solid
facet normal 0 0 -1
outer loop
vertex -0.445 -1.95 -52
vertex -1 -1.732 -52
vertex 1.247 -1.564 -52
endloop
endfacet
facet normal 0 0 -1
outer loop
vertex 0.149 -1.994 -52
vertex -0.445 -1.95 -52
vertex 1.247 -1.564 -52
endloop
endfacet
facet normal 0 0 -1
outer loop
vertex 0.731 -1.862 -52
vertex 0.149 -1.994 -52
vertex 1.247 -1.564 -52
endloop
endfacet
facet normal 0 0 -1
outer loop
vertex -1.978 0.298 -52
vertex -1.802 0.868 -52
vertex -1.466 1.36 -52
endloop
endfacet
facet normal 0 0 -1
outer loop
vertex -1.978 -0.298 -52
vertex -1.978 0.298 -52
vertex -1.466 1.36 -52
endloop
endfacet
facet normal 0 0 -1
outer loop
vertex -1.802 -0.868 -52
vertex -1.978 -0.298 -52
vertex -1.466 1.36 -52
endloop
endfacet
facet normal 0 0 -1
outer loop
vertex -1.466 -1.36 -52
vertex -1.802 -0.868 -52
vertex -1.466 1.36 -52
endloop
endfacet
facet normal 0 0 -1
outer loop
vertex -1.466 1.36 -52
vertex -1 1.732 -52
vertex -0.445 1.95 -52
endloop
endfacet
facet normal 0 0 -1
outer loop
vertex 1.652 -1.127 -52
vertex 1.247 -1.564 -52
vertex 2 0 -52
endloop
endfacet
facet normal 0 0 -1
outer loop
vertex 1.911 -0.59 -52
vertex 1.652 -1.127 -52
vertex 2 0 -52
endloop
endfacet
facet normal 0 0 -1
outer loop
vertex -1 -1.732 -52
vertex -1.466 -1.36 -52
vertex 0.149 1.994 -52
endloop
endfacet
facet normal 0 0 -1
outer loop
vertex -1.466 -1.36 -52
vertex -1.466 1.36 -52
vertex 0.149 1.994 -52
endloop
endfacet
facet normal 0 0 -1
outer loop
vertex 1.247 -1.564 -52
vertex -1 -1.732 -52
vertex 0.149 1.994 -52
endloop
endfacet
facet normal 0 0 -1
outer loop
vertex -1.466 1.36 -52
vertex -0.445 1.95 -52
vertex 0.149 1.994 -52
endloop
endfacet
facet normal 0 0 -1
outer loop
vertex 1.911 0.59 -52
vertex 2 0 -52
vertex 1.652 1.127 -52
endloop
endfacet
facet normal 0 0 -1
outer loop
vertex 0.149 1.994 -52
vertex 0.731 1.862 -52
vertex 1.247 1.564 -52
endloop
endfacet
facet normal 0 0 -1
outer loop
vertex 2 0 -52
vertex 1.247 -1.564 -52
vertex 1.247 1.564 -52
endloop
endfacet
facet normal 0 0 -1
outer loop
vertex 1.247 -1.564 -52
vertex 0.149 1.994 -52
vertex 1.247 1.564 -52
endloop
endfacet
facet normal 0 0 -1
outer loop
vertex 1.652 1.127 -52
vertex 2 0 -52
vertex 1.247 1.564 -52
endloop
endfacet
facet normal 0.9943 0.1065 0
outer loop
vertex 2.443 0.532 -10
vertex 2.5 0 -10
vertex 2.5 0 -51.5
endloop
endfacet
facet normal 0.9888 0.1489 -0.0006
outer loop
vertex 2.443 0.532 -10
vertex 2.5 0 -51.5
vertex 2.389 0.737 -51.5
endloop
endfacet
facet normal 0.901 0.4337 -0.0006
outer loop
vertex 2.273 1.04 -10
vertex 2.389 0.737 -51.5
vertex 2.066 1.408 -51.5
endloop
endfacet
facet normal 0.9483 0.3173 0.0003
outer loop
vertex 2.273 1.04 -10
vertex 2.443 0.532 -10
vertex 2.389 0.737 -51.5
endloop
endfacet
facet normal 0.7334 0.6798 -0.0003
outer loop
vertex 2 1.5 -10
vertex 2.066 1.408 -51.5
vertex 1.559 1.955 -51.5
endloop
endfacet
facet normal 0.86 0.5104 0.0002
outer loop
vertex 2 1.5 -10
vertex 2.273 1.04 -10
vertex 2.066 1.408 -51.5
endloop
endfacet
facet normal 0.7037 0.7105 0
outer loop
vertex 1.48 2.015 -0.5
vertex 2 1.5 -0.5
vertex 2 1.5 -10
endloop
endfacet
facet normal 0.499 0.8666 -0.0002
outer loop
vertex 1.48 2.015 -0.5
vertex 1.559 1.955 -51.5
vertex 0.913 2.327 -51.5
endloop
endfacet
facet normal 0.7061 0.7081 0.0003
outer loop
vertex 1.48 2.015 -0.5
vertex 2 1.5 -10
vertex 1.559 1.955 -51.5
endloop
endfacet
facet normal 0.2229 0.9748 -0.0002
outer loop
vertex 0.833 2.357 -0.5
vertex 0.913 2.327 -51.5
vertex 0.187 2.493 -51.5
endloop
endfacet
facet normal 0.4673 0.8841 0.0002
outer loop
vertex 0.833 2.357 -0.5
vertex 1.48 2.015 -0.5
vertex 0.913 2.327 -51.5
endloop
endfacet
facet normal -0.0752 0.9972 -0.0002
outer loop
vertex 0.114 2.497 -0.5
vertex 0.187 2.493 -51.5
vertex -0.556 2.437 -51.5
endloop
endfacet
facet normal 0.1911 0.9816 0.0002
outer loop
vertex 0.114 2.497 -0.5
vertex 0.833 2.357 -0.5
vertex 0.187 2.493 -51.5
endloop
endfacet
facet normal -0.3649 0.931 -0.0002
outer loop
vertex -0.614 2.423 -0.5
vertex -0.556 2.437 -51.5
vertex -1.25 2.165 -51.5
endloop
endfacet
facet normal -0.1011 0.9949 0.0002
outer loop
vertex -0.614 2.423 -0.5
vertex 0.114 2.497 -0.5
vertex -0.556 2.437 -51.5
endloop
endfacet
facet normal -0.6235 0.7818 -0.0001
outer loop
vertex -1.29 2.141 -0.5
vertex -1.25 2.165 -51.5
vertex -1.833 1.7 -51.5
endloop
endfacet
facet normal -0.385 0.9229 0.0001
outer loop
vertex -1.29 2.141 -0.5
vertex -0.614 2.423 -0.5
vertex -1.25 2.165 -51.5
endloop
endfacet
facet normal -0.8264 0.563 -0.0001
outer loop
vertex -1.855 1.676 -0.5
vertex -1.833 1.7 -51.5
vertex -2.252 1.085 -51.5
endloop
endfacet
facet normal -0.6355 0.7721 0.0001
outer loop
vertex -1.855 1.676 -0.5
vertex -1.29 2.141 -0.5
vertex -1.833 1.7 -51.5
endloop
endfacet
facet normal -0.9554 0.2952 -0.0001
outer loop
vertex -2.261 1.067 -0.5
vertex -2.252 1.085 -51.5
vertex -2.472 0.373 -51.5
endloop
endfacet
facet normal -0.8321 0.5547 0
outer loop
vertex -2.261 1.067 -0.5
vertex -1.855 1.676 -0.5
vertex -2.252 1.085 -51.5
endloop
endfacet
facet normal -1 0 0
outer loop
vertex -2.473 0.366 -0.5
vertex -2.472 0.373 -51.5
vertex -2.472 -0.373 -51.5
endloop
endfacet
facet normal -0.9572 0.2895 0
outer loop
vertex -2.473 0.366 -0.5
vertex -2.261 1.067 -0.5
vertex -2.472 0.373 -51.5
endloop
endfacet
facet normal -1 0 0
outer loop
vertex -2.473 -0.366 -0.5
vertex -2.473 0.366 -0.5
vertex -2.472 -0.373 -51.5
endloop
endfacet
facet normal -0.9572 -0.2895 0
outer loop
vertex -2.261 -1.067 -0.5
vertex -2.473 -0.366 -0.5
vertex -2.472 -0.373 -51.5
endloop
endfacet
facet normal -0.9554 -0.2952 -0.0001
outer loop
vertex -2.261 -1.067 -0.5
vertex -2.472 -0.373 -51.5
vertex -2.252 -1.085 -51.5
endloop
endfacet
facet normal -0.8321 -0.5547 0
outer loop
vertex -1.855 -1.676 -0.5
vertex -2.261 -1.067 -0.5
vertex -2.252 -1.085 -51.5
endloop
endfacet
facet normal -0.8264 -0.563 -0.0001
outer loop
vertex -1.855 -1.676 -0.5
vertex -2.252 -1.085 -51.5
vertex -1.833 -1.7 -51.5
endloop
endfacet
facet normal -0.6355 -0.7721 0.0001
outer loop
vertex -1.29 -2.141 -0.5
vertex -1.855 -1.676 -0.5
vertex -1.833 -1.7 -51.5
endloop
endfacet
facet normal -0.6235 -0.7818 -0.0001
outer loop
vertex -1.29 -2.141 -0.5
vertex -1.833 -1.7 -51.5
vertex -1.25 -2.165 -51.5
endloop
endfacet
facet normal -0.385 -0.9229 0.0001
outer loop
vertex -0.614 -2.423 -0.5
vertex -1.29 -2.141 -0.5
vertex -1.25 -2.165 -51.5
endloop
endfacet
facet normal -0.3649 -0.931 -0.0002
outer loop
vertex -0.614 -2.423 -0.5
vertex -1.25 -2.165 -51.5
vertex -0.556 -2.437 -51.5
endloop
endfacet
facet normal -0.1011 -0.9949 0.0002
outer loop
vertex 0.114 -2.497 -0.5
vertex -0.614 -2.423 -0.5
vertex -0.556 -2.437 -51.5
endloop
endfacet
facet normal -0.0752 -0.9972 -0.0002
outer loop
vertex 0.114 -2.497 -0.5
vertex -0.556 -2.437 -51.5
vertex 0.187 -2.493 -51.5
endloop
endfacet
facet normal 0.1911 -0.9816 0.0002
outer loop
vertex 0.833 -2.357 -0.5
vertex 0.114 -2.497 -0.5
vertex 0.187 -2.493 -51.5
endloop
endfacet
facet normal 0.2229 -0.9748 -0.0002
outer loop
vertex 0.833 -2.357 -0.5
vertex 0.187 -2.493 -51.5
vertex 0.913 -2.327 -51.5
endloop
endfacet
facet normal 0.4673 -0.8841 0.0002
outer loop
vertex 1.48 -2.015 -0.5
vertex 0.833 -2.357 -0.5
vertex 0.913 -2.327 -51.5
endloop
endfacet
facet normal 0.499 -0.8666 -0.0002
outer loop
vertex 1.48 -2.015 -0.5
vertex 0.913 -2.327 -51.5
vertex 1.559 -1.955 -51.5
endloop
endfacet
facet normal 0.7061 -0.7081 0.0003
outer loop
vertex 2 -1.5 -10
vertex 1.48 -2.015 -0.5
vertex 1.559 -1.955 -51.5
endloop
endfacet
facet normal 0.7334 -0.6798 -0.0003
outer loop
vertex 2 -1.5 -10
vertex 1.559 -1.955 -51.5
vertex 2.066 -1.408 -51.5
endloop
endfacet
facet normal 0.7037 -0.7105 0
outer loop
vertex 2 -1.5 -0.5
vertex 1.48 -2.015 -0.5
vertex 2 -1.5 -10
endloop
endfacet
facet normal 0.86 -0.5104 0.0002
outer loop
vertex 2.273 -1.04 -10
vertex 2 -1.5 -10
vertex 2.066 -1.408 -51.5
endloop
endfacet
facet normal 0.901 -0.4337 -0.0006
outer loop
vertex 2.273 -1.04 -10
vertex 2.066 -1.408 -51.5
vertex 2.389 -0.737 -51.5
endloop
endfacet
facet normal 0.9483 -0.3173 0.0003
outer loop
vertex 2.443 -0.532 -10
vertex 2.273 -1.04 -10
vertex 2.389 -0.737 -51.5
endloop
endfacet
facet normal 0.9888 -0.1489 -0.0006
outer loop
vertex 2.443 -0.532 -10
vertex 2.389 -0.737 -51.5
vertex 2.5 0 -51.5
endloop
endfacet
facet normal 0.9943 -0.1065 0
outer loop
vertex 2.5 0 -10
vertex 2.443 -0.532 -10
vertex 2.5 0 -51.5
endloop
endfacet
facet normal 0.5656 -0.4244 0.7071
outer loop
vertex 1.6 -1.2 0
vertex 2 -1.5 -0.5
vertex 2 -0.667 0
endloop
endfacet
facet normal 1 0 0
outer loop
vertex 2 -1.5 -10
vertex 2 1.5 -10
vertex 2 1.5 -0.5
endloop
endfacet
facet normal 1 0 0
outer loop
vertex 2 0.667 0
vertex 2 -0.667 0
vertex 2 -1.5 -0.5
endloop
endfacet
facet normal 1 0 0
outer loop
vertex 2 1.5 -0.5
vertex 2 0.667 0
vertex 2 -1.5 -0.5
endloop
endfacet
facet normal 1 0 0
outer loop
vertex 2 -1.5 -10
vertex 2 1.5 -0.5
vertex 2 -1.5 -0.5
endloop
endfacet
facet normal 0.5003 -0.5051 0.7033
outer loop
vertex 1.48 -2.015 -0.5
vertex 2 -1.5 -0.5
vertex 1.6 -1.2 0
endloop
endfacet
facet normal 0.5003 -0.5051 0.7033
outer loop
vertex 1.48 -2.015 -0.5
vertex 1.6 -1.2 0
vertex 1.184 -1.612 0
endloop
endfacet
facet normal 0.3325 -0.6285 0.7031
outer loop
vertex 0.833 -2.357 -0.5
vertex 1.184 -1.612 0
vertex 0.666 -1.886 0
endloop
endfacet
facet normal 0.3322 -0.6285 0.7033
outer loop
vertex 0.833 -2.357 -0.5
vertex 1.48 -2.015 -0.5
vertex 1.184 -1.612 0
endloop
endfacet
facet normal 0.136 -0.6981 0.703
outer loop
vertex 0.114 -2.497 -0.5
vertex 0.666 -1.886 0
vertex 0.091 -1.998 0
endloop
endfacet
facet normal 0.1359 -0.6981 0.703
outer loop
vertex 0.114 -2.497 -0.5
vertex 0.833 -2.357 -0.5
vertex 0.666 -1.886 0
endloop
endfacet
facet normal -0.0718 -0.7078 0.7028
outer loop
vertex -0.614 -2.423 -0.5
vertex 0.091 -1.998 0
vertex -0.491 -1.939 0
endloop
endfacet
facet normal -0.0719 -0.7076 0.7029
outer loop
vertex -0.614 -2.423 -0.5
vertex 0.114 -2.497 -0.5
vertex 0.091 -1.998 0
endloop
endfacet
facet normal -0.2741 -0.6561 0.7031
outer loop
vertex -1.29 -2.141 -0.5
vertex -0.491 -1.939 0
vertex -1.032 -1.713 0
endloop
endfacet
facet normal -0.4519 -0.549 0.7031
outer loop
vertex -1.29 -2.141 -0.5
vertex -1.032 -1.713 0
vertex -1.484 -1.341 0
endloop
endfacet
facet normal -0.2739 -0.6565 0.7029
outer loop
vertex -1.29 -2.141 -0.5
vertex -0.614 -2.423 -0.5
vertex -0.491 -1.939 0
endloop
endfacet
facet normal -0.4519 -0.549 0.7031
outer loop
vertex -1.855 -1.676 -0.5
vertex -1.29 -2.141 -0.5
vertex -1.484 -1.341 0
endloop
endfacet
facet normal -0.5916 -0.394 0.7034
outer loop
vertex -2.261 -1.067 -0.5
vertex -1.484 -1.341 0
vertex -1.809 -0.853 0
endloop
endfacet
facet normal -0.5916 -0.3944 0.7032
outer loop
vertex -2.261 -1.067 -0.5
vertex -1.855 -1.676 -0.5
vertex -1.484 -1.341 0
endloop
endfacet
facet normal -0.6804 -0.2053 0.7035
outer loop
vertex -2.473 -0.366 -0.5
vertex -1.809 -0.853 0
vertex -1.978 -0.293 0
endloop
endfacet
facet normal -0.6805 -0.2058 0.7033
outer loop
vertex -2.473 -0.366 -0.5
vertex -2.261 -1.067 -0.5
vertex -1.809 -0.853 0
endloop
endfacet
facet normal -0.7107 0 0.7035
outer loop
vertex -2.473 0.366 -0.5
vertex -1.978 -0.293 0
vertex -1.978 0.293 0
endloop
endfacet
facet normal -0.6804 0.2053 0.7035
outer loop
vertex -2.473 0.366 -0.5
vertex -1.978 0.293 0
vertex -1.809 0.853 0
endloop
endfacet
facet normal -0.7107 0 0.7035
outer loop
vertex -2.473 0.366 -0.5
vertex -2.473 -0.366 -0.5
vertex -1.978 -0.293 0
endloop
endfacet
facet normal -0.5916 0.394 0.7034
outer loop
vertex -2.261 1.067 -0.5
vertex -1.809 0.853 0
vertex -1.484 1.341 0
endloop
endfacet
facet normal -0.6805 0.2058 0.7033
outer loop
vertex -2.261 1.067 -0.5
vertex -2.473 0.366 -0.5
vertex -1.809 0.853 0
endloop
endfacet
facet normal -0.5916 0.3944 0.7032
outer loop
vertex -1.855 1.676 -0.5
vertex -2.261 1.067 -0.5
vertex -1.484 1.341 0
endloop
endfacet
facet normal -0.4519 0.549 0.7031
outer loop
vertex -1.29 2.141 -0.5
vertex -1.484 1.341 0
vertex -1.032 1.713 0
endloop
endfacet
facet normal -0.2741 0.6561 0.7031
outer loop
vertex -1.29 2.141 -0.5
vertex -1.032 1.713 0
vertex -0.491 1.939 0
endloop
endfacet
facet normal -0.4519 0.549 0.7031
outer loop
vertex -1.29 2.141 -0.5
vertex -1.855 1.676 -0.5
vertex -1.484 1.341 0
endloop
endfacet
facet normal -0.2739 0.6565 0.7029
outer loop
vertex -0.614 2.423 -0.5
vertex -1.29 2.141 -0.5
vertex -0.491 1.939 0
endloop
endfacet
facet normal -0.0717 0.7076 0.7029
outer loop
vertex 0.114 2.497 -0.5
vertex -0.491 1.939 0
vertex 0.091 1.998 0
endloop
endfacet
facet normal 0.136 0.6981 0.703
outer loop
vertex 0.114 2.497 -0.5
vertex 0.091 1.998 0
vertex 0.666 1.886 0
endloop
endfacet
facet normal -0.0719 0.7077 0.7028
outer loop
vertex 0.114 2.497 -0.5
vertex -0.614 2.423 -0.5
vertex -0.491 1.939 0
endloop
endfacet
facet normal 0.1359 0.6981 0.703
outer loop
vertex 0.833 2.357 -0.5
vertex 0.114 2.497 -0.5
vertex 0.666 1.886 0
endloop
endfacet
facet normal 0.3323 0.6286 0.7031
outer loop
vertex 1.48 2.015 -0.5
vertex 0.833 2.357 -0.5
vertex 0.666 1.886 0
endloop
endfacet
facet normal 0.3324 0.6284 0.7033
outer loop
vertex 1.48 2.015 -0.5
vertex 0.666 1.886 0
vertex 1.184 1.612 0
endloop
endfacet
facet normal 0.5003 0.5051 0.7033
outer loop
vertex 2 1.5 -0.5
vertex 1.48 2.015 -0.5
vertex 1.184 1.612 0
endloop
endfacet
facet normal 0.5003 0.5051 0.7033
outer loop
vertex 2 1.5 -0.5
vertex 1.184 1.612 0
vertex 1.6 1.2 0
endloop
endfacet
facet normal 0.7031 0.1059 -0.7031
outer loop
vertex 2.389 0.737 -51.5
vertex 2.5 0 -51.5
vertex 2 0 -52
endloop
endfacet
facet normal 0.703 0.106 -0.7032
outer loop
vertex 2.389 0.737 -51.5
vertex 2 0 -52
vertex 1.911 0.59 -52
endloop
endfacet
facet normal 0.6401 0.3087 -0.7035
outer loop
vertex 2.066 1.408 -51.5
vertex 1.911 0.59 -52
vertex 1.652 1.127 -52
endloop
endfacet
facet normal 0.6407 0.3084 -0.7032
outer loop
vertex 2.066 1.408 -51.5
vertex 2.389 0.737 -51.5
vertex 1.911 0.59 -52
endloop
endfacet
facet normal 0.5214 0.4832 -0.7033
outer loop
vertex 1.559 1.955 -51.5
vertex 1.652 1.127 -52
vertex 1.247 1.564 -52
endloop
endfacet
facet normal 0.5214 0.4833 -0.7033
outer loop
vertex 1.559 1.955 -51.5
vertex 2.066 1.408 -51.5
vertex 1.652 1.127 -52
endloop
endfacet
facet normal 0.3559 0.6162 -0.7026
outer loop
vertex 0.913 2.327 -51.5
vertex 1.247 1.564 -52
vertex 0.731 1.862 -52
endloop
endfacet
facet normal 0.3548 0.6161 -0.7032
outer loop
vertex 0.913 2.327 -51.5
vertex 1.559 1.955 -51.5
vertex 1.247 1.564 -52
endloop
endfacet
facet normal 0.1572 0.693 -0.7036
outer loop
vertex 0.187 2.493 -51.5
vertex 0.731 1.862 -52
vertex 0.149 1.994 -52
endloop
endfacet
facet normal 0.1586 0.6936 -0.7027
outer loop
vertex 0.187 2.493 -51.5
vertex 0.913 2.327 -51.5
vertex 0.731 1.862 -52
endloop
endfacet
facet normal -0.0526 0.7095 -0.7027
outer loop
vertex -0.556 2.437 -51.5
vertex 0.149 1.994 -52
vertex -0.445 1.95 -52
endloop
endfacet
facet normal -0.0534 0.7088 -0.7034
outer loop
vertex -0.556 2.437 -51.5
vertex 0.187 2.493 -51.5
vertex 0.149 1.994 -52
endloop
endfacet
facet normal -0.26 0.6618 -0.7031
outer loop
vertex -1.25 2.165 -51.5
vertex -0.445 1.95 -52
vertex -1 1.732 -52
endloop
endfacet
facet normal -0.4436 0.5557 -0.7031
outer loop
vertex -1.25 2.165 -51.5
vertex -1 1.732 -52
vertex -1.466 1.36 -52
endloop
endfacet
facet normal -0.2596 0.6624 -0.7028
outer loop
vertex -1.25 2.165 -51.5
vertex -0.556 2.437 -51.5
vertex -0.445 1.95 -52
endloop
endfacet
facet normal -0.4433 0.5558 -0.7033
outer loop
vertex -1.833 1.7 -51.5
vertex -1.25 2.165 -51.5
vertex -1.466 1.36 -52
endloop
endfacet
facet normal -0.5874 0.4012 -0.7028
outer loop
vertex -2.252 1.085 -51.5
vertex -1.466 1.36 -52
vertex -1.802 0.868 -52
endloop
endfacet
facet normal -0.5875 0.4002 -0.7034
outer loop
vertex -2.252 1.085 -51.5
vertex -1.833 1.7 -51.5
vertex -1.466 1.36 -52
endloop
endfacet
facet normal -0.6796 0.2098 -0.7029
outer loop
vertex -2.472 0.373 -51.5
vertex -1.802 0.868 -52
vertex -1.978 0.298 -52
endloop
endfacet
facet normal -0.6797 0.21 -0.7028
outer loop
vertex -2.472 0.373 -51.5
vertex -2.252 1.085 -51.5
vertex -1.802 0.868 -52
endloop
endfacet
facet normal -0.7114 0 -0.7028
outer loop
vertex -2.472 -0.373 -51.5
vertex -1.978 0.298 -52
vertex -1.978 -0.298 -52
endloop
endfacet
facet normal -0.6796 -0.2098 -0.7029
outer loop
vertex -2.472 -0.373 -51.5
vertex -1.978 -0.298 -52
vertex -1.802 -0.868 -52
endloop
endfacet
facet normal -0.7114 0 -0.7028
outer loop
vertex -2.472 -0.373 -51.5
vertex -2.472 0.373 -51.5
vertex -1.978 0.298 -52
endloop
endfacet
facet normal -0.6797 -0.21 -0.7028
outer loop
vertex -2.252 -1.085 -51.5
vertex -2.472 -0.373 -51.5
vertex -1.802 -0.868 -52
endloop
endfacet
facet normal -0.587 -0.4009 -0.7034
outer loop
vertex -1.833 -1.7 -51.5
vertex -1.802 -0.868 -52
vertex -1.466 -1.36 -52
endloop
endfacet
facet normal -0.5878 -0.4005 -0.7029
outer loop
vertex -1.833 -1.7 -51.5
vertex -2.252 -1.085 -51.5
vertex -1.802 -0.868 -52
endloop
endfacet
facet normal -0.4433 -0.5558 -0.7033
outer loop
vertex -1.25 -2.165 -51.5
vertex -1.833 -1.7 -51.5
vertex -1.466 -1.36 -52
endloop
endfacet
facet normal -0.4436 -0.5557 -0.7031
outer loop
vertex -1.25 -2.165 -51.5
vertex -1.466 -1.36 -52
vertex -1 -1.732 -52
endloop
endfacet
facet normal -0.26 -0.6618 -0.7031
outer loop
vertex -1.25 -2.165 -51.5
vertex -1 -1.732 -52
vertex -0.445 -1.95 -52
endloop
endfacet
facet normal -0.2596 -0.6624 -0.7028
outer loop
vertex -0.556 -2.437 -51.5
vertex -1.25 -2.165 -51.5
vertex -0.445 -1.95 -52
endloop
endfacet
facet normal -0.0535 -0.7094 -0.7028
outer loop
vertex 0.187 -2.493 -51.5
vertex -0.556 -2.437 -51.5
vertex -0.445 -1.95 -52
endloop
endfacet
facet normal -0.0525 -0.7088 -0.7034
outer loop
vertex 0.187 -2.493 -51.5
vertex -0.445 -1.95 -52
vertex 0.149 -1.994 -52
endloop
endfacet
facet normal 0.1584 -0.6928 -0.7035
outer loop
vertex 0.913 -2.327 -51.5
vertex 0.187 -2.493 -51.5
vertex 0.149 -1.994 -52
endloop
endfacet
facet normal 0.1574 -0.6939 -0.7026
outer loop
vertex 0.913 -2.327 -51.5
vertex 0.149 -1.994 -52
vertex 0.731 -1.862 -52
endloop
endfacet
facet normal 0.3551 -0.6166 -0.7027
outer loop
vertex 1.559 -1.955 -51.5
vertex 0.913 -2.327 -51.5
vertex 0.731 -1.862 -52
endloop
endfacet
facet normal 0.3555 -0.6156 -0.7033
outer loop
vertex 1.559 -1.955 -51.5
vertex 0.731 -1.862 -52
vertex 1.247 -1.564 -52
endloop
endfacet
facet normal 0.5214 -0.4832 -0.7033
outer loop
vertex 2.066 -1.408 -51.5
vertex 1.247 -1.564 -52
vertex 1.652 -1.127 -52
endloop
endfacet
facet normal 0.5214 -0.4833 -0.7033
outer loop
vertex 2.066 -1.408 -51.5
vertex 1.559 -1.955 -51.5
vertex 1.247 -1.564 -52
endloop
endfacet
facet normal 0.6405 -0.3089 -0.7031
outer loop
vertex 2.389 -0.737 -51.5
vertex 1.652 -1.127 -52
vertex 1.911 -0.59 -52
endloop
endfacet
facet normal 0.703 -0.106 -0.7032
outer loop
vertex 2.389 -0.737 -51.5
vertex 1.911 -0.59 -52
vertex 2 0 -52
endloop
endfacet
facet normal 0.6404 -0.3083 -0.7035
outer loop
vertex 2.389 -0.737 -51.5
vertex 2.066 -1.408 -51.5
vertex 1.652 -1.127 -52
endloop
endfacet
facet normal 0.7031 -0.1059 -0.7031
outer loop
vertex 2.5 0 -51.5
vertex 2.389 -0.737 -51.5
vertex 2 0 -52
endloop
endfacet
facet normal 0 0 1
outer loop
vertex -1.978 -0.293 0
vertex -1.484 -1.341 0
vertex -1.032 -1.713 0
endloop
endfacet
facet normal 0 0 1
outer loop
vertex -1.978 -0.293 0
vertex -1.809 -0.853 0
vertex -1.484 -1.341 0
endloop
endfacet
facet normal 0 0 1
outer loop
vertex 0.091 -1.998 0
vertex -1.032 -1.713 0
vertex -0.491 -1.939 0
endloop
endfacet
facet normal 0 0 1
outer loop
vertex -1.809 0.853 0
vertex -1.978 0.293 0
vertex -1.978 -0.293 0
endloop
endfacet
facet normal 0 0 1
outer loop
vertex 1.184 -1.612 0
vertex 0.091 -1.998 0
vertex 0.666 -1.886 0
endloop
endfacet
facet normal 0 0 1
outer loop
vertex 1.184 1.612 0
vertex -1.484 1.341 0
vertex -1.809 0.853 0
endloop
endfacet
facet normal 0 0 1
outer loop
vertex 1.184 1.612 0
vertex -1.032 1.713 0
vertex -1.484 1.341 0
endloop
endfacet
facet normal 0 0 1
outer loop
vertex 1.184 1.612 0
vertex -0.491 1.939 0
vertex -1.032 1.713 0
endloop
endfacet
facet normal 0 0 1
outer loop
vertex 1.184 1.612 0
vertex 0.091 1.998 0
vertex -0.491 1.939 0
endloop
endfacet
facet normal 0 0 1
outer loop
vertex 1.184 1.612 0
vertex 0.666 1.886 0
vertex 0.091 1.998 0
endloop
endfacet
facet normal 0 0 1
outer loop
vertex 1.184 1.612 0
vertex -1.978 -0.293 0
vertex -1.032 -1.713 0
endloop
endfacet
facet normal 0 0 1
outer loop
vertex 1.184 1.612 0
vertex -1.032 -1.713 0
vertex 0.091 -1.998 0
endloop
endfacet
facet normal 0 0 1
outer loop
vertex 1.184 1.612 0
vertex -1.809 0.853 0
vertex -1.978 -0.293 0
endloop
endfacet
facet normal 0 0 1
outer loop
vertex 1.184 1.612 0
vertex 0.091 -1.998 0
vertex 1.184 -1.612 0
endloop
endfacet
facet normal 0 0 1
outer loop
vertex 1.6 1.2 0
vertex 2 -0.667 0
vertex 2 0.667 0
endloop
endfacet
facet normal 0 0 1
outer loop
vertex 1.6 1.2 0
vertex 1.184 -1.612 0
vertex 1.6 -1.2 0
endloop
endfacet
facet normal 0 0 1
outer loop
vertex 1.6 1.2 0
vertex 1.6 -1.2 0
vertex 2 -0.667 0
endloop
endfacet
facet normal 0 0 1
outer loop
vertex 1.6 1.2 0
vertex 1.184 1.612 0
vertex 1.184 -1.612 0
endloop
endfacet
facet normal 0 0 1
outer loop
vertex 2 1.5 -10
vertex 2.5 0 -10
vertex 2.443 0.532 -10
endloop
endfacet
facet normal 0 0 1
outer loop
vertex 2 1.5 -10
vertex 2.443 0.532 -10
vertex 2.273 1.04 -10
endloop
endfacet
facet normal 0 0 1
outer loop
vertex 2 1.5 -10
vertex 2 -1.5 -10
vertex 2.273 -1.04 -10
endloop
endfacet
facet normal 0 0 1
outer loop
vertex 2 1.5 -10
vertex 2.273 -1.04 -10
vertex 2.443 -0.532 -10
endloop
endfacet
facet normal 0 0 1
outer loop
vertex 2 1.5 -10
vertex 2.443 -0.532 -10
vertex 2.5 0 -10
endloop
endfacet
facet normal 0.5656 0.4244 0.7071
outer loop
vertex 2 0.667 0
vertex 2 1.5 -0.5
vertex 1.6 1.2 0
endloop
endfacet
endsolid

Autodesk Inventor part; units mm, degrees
ref_plane "YZ Plane" through (0, 0, 0) normal (1, 0, 0) x (0, 1, 0)
ref_plane "XZ Plane" through (0, 0, 0) normal (0, 1, 0) x (-1, 0, 0)
ref_plane "XY Plane" through (0, 0, 0) normal (0, 0, 1) x (1, 0, 0)
sketch "Sketch1" plane through (0, 0, 0) normal (0, 0, 1) x (1, 0, 0)
  circle A0 centre (0, 0) radius 2.5
  line L0 (2, 1.5) -> (2, -1.5)
  dimension "d0" = 5
  dimension "d1" = 2
extrude "Extrusion1" add sketch "Sketch1" against normal blind 52
extrude "Extrusion2" cut sketch "Sketch1" against normal blind 10 contours A0 L0 picked at (2.0912, -0.3466)
chamfer "Chamfer1" distance 0.5 angle 45 2 edges at (-2.5, 0, 0) (-2.5, 0, -52)
properties part number "Flywheelshaft"
